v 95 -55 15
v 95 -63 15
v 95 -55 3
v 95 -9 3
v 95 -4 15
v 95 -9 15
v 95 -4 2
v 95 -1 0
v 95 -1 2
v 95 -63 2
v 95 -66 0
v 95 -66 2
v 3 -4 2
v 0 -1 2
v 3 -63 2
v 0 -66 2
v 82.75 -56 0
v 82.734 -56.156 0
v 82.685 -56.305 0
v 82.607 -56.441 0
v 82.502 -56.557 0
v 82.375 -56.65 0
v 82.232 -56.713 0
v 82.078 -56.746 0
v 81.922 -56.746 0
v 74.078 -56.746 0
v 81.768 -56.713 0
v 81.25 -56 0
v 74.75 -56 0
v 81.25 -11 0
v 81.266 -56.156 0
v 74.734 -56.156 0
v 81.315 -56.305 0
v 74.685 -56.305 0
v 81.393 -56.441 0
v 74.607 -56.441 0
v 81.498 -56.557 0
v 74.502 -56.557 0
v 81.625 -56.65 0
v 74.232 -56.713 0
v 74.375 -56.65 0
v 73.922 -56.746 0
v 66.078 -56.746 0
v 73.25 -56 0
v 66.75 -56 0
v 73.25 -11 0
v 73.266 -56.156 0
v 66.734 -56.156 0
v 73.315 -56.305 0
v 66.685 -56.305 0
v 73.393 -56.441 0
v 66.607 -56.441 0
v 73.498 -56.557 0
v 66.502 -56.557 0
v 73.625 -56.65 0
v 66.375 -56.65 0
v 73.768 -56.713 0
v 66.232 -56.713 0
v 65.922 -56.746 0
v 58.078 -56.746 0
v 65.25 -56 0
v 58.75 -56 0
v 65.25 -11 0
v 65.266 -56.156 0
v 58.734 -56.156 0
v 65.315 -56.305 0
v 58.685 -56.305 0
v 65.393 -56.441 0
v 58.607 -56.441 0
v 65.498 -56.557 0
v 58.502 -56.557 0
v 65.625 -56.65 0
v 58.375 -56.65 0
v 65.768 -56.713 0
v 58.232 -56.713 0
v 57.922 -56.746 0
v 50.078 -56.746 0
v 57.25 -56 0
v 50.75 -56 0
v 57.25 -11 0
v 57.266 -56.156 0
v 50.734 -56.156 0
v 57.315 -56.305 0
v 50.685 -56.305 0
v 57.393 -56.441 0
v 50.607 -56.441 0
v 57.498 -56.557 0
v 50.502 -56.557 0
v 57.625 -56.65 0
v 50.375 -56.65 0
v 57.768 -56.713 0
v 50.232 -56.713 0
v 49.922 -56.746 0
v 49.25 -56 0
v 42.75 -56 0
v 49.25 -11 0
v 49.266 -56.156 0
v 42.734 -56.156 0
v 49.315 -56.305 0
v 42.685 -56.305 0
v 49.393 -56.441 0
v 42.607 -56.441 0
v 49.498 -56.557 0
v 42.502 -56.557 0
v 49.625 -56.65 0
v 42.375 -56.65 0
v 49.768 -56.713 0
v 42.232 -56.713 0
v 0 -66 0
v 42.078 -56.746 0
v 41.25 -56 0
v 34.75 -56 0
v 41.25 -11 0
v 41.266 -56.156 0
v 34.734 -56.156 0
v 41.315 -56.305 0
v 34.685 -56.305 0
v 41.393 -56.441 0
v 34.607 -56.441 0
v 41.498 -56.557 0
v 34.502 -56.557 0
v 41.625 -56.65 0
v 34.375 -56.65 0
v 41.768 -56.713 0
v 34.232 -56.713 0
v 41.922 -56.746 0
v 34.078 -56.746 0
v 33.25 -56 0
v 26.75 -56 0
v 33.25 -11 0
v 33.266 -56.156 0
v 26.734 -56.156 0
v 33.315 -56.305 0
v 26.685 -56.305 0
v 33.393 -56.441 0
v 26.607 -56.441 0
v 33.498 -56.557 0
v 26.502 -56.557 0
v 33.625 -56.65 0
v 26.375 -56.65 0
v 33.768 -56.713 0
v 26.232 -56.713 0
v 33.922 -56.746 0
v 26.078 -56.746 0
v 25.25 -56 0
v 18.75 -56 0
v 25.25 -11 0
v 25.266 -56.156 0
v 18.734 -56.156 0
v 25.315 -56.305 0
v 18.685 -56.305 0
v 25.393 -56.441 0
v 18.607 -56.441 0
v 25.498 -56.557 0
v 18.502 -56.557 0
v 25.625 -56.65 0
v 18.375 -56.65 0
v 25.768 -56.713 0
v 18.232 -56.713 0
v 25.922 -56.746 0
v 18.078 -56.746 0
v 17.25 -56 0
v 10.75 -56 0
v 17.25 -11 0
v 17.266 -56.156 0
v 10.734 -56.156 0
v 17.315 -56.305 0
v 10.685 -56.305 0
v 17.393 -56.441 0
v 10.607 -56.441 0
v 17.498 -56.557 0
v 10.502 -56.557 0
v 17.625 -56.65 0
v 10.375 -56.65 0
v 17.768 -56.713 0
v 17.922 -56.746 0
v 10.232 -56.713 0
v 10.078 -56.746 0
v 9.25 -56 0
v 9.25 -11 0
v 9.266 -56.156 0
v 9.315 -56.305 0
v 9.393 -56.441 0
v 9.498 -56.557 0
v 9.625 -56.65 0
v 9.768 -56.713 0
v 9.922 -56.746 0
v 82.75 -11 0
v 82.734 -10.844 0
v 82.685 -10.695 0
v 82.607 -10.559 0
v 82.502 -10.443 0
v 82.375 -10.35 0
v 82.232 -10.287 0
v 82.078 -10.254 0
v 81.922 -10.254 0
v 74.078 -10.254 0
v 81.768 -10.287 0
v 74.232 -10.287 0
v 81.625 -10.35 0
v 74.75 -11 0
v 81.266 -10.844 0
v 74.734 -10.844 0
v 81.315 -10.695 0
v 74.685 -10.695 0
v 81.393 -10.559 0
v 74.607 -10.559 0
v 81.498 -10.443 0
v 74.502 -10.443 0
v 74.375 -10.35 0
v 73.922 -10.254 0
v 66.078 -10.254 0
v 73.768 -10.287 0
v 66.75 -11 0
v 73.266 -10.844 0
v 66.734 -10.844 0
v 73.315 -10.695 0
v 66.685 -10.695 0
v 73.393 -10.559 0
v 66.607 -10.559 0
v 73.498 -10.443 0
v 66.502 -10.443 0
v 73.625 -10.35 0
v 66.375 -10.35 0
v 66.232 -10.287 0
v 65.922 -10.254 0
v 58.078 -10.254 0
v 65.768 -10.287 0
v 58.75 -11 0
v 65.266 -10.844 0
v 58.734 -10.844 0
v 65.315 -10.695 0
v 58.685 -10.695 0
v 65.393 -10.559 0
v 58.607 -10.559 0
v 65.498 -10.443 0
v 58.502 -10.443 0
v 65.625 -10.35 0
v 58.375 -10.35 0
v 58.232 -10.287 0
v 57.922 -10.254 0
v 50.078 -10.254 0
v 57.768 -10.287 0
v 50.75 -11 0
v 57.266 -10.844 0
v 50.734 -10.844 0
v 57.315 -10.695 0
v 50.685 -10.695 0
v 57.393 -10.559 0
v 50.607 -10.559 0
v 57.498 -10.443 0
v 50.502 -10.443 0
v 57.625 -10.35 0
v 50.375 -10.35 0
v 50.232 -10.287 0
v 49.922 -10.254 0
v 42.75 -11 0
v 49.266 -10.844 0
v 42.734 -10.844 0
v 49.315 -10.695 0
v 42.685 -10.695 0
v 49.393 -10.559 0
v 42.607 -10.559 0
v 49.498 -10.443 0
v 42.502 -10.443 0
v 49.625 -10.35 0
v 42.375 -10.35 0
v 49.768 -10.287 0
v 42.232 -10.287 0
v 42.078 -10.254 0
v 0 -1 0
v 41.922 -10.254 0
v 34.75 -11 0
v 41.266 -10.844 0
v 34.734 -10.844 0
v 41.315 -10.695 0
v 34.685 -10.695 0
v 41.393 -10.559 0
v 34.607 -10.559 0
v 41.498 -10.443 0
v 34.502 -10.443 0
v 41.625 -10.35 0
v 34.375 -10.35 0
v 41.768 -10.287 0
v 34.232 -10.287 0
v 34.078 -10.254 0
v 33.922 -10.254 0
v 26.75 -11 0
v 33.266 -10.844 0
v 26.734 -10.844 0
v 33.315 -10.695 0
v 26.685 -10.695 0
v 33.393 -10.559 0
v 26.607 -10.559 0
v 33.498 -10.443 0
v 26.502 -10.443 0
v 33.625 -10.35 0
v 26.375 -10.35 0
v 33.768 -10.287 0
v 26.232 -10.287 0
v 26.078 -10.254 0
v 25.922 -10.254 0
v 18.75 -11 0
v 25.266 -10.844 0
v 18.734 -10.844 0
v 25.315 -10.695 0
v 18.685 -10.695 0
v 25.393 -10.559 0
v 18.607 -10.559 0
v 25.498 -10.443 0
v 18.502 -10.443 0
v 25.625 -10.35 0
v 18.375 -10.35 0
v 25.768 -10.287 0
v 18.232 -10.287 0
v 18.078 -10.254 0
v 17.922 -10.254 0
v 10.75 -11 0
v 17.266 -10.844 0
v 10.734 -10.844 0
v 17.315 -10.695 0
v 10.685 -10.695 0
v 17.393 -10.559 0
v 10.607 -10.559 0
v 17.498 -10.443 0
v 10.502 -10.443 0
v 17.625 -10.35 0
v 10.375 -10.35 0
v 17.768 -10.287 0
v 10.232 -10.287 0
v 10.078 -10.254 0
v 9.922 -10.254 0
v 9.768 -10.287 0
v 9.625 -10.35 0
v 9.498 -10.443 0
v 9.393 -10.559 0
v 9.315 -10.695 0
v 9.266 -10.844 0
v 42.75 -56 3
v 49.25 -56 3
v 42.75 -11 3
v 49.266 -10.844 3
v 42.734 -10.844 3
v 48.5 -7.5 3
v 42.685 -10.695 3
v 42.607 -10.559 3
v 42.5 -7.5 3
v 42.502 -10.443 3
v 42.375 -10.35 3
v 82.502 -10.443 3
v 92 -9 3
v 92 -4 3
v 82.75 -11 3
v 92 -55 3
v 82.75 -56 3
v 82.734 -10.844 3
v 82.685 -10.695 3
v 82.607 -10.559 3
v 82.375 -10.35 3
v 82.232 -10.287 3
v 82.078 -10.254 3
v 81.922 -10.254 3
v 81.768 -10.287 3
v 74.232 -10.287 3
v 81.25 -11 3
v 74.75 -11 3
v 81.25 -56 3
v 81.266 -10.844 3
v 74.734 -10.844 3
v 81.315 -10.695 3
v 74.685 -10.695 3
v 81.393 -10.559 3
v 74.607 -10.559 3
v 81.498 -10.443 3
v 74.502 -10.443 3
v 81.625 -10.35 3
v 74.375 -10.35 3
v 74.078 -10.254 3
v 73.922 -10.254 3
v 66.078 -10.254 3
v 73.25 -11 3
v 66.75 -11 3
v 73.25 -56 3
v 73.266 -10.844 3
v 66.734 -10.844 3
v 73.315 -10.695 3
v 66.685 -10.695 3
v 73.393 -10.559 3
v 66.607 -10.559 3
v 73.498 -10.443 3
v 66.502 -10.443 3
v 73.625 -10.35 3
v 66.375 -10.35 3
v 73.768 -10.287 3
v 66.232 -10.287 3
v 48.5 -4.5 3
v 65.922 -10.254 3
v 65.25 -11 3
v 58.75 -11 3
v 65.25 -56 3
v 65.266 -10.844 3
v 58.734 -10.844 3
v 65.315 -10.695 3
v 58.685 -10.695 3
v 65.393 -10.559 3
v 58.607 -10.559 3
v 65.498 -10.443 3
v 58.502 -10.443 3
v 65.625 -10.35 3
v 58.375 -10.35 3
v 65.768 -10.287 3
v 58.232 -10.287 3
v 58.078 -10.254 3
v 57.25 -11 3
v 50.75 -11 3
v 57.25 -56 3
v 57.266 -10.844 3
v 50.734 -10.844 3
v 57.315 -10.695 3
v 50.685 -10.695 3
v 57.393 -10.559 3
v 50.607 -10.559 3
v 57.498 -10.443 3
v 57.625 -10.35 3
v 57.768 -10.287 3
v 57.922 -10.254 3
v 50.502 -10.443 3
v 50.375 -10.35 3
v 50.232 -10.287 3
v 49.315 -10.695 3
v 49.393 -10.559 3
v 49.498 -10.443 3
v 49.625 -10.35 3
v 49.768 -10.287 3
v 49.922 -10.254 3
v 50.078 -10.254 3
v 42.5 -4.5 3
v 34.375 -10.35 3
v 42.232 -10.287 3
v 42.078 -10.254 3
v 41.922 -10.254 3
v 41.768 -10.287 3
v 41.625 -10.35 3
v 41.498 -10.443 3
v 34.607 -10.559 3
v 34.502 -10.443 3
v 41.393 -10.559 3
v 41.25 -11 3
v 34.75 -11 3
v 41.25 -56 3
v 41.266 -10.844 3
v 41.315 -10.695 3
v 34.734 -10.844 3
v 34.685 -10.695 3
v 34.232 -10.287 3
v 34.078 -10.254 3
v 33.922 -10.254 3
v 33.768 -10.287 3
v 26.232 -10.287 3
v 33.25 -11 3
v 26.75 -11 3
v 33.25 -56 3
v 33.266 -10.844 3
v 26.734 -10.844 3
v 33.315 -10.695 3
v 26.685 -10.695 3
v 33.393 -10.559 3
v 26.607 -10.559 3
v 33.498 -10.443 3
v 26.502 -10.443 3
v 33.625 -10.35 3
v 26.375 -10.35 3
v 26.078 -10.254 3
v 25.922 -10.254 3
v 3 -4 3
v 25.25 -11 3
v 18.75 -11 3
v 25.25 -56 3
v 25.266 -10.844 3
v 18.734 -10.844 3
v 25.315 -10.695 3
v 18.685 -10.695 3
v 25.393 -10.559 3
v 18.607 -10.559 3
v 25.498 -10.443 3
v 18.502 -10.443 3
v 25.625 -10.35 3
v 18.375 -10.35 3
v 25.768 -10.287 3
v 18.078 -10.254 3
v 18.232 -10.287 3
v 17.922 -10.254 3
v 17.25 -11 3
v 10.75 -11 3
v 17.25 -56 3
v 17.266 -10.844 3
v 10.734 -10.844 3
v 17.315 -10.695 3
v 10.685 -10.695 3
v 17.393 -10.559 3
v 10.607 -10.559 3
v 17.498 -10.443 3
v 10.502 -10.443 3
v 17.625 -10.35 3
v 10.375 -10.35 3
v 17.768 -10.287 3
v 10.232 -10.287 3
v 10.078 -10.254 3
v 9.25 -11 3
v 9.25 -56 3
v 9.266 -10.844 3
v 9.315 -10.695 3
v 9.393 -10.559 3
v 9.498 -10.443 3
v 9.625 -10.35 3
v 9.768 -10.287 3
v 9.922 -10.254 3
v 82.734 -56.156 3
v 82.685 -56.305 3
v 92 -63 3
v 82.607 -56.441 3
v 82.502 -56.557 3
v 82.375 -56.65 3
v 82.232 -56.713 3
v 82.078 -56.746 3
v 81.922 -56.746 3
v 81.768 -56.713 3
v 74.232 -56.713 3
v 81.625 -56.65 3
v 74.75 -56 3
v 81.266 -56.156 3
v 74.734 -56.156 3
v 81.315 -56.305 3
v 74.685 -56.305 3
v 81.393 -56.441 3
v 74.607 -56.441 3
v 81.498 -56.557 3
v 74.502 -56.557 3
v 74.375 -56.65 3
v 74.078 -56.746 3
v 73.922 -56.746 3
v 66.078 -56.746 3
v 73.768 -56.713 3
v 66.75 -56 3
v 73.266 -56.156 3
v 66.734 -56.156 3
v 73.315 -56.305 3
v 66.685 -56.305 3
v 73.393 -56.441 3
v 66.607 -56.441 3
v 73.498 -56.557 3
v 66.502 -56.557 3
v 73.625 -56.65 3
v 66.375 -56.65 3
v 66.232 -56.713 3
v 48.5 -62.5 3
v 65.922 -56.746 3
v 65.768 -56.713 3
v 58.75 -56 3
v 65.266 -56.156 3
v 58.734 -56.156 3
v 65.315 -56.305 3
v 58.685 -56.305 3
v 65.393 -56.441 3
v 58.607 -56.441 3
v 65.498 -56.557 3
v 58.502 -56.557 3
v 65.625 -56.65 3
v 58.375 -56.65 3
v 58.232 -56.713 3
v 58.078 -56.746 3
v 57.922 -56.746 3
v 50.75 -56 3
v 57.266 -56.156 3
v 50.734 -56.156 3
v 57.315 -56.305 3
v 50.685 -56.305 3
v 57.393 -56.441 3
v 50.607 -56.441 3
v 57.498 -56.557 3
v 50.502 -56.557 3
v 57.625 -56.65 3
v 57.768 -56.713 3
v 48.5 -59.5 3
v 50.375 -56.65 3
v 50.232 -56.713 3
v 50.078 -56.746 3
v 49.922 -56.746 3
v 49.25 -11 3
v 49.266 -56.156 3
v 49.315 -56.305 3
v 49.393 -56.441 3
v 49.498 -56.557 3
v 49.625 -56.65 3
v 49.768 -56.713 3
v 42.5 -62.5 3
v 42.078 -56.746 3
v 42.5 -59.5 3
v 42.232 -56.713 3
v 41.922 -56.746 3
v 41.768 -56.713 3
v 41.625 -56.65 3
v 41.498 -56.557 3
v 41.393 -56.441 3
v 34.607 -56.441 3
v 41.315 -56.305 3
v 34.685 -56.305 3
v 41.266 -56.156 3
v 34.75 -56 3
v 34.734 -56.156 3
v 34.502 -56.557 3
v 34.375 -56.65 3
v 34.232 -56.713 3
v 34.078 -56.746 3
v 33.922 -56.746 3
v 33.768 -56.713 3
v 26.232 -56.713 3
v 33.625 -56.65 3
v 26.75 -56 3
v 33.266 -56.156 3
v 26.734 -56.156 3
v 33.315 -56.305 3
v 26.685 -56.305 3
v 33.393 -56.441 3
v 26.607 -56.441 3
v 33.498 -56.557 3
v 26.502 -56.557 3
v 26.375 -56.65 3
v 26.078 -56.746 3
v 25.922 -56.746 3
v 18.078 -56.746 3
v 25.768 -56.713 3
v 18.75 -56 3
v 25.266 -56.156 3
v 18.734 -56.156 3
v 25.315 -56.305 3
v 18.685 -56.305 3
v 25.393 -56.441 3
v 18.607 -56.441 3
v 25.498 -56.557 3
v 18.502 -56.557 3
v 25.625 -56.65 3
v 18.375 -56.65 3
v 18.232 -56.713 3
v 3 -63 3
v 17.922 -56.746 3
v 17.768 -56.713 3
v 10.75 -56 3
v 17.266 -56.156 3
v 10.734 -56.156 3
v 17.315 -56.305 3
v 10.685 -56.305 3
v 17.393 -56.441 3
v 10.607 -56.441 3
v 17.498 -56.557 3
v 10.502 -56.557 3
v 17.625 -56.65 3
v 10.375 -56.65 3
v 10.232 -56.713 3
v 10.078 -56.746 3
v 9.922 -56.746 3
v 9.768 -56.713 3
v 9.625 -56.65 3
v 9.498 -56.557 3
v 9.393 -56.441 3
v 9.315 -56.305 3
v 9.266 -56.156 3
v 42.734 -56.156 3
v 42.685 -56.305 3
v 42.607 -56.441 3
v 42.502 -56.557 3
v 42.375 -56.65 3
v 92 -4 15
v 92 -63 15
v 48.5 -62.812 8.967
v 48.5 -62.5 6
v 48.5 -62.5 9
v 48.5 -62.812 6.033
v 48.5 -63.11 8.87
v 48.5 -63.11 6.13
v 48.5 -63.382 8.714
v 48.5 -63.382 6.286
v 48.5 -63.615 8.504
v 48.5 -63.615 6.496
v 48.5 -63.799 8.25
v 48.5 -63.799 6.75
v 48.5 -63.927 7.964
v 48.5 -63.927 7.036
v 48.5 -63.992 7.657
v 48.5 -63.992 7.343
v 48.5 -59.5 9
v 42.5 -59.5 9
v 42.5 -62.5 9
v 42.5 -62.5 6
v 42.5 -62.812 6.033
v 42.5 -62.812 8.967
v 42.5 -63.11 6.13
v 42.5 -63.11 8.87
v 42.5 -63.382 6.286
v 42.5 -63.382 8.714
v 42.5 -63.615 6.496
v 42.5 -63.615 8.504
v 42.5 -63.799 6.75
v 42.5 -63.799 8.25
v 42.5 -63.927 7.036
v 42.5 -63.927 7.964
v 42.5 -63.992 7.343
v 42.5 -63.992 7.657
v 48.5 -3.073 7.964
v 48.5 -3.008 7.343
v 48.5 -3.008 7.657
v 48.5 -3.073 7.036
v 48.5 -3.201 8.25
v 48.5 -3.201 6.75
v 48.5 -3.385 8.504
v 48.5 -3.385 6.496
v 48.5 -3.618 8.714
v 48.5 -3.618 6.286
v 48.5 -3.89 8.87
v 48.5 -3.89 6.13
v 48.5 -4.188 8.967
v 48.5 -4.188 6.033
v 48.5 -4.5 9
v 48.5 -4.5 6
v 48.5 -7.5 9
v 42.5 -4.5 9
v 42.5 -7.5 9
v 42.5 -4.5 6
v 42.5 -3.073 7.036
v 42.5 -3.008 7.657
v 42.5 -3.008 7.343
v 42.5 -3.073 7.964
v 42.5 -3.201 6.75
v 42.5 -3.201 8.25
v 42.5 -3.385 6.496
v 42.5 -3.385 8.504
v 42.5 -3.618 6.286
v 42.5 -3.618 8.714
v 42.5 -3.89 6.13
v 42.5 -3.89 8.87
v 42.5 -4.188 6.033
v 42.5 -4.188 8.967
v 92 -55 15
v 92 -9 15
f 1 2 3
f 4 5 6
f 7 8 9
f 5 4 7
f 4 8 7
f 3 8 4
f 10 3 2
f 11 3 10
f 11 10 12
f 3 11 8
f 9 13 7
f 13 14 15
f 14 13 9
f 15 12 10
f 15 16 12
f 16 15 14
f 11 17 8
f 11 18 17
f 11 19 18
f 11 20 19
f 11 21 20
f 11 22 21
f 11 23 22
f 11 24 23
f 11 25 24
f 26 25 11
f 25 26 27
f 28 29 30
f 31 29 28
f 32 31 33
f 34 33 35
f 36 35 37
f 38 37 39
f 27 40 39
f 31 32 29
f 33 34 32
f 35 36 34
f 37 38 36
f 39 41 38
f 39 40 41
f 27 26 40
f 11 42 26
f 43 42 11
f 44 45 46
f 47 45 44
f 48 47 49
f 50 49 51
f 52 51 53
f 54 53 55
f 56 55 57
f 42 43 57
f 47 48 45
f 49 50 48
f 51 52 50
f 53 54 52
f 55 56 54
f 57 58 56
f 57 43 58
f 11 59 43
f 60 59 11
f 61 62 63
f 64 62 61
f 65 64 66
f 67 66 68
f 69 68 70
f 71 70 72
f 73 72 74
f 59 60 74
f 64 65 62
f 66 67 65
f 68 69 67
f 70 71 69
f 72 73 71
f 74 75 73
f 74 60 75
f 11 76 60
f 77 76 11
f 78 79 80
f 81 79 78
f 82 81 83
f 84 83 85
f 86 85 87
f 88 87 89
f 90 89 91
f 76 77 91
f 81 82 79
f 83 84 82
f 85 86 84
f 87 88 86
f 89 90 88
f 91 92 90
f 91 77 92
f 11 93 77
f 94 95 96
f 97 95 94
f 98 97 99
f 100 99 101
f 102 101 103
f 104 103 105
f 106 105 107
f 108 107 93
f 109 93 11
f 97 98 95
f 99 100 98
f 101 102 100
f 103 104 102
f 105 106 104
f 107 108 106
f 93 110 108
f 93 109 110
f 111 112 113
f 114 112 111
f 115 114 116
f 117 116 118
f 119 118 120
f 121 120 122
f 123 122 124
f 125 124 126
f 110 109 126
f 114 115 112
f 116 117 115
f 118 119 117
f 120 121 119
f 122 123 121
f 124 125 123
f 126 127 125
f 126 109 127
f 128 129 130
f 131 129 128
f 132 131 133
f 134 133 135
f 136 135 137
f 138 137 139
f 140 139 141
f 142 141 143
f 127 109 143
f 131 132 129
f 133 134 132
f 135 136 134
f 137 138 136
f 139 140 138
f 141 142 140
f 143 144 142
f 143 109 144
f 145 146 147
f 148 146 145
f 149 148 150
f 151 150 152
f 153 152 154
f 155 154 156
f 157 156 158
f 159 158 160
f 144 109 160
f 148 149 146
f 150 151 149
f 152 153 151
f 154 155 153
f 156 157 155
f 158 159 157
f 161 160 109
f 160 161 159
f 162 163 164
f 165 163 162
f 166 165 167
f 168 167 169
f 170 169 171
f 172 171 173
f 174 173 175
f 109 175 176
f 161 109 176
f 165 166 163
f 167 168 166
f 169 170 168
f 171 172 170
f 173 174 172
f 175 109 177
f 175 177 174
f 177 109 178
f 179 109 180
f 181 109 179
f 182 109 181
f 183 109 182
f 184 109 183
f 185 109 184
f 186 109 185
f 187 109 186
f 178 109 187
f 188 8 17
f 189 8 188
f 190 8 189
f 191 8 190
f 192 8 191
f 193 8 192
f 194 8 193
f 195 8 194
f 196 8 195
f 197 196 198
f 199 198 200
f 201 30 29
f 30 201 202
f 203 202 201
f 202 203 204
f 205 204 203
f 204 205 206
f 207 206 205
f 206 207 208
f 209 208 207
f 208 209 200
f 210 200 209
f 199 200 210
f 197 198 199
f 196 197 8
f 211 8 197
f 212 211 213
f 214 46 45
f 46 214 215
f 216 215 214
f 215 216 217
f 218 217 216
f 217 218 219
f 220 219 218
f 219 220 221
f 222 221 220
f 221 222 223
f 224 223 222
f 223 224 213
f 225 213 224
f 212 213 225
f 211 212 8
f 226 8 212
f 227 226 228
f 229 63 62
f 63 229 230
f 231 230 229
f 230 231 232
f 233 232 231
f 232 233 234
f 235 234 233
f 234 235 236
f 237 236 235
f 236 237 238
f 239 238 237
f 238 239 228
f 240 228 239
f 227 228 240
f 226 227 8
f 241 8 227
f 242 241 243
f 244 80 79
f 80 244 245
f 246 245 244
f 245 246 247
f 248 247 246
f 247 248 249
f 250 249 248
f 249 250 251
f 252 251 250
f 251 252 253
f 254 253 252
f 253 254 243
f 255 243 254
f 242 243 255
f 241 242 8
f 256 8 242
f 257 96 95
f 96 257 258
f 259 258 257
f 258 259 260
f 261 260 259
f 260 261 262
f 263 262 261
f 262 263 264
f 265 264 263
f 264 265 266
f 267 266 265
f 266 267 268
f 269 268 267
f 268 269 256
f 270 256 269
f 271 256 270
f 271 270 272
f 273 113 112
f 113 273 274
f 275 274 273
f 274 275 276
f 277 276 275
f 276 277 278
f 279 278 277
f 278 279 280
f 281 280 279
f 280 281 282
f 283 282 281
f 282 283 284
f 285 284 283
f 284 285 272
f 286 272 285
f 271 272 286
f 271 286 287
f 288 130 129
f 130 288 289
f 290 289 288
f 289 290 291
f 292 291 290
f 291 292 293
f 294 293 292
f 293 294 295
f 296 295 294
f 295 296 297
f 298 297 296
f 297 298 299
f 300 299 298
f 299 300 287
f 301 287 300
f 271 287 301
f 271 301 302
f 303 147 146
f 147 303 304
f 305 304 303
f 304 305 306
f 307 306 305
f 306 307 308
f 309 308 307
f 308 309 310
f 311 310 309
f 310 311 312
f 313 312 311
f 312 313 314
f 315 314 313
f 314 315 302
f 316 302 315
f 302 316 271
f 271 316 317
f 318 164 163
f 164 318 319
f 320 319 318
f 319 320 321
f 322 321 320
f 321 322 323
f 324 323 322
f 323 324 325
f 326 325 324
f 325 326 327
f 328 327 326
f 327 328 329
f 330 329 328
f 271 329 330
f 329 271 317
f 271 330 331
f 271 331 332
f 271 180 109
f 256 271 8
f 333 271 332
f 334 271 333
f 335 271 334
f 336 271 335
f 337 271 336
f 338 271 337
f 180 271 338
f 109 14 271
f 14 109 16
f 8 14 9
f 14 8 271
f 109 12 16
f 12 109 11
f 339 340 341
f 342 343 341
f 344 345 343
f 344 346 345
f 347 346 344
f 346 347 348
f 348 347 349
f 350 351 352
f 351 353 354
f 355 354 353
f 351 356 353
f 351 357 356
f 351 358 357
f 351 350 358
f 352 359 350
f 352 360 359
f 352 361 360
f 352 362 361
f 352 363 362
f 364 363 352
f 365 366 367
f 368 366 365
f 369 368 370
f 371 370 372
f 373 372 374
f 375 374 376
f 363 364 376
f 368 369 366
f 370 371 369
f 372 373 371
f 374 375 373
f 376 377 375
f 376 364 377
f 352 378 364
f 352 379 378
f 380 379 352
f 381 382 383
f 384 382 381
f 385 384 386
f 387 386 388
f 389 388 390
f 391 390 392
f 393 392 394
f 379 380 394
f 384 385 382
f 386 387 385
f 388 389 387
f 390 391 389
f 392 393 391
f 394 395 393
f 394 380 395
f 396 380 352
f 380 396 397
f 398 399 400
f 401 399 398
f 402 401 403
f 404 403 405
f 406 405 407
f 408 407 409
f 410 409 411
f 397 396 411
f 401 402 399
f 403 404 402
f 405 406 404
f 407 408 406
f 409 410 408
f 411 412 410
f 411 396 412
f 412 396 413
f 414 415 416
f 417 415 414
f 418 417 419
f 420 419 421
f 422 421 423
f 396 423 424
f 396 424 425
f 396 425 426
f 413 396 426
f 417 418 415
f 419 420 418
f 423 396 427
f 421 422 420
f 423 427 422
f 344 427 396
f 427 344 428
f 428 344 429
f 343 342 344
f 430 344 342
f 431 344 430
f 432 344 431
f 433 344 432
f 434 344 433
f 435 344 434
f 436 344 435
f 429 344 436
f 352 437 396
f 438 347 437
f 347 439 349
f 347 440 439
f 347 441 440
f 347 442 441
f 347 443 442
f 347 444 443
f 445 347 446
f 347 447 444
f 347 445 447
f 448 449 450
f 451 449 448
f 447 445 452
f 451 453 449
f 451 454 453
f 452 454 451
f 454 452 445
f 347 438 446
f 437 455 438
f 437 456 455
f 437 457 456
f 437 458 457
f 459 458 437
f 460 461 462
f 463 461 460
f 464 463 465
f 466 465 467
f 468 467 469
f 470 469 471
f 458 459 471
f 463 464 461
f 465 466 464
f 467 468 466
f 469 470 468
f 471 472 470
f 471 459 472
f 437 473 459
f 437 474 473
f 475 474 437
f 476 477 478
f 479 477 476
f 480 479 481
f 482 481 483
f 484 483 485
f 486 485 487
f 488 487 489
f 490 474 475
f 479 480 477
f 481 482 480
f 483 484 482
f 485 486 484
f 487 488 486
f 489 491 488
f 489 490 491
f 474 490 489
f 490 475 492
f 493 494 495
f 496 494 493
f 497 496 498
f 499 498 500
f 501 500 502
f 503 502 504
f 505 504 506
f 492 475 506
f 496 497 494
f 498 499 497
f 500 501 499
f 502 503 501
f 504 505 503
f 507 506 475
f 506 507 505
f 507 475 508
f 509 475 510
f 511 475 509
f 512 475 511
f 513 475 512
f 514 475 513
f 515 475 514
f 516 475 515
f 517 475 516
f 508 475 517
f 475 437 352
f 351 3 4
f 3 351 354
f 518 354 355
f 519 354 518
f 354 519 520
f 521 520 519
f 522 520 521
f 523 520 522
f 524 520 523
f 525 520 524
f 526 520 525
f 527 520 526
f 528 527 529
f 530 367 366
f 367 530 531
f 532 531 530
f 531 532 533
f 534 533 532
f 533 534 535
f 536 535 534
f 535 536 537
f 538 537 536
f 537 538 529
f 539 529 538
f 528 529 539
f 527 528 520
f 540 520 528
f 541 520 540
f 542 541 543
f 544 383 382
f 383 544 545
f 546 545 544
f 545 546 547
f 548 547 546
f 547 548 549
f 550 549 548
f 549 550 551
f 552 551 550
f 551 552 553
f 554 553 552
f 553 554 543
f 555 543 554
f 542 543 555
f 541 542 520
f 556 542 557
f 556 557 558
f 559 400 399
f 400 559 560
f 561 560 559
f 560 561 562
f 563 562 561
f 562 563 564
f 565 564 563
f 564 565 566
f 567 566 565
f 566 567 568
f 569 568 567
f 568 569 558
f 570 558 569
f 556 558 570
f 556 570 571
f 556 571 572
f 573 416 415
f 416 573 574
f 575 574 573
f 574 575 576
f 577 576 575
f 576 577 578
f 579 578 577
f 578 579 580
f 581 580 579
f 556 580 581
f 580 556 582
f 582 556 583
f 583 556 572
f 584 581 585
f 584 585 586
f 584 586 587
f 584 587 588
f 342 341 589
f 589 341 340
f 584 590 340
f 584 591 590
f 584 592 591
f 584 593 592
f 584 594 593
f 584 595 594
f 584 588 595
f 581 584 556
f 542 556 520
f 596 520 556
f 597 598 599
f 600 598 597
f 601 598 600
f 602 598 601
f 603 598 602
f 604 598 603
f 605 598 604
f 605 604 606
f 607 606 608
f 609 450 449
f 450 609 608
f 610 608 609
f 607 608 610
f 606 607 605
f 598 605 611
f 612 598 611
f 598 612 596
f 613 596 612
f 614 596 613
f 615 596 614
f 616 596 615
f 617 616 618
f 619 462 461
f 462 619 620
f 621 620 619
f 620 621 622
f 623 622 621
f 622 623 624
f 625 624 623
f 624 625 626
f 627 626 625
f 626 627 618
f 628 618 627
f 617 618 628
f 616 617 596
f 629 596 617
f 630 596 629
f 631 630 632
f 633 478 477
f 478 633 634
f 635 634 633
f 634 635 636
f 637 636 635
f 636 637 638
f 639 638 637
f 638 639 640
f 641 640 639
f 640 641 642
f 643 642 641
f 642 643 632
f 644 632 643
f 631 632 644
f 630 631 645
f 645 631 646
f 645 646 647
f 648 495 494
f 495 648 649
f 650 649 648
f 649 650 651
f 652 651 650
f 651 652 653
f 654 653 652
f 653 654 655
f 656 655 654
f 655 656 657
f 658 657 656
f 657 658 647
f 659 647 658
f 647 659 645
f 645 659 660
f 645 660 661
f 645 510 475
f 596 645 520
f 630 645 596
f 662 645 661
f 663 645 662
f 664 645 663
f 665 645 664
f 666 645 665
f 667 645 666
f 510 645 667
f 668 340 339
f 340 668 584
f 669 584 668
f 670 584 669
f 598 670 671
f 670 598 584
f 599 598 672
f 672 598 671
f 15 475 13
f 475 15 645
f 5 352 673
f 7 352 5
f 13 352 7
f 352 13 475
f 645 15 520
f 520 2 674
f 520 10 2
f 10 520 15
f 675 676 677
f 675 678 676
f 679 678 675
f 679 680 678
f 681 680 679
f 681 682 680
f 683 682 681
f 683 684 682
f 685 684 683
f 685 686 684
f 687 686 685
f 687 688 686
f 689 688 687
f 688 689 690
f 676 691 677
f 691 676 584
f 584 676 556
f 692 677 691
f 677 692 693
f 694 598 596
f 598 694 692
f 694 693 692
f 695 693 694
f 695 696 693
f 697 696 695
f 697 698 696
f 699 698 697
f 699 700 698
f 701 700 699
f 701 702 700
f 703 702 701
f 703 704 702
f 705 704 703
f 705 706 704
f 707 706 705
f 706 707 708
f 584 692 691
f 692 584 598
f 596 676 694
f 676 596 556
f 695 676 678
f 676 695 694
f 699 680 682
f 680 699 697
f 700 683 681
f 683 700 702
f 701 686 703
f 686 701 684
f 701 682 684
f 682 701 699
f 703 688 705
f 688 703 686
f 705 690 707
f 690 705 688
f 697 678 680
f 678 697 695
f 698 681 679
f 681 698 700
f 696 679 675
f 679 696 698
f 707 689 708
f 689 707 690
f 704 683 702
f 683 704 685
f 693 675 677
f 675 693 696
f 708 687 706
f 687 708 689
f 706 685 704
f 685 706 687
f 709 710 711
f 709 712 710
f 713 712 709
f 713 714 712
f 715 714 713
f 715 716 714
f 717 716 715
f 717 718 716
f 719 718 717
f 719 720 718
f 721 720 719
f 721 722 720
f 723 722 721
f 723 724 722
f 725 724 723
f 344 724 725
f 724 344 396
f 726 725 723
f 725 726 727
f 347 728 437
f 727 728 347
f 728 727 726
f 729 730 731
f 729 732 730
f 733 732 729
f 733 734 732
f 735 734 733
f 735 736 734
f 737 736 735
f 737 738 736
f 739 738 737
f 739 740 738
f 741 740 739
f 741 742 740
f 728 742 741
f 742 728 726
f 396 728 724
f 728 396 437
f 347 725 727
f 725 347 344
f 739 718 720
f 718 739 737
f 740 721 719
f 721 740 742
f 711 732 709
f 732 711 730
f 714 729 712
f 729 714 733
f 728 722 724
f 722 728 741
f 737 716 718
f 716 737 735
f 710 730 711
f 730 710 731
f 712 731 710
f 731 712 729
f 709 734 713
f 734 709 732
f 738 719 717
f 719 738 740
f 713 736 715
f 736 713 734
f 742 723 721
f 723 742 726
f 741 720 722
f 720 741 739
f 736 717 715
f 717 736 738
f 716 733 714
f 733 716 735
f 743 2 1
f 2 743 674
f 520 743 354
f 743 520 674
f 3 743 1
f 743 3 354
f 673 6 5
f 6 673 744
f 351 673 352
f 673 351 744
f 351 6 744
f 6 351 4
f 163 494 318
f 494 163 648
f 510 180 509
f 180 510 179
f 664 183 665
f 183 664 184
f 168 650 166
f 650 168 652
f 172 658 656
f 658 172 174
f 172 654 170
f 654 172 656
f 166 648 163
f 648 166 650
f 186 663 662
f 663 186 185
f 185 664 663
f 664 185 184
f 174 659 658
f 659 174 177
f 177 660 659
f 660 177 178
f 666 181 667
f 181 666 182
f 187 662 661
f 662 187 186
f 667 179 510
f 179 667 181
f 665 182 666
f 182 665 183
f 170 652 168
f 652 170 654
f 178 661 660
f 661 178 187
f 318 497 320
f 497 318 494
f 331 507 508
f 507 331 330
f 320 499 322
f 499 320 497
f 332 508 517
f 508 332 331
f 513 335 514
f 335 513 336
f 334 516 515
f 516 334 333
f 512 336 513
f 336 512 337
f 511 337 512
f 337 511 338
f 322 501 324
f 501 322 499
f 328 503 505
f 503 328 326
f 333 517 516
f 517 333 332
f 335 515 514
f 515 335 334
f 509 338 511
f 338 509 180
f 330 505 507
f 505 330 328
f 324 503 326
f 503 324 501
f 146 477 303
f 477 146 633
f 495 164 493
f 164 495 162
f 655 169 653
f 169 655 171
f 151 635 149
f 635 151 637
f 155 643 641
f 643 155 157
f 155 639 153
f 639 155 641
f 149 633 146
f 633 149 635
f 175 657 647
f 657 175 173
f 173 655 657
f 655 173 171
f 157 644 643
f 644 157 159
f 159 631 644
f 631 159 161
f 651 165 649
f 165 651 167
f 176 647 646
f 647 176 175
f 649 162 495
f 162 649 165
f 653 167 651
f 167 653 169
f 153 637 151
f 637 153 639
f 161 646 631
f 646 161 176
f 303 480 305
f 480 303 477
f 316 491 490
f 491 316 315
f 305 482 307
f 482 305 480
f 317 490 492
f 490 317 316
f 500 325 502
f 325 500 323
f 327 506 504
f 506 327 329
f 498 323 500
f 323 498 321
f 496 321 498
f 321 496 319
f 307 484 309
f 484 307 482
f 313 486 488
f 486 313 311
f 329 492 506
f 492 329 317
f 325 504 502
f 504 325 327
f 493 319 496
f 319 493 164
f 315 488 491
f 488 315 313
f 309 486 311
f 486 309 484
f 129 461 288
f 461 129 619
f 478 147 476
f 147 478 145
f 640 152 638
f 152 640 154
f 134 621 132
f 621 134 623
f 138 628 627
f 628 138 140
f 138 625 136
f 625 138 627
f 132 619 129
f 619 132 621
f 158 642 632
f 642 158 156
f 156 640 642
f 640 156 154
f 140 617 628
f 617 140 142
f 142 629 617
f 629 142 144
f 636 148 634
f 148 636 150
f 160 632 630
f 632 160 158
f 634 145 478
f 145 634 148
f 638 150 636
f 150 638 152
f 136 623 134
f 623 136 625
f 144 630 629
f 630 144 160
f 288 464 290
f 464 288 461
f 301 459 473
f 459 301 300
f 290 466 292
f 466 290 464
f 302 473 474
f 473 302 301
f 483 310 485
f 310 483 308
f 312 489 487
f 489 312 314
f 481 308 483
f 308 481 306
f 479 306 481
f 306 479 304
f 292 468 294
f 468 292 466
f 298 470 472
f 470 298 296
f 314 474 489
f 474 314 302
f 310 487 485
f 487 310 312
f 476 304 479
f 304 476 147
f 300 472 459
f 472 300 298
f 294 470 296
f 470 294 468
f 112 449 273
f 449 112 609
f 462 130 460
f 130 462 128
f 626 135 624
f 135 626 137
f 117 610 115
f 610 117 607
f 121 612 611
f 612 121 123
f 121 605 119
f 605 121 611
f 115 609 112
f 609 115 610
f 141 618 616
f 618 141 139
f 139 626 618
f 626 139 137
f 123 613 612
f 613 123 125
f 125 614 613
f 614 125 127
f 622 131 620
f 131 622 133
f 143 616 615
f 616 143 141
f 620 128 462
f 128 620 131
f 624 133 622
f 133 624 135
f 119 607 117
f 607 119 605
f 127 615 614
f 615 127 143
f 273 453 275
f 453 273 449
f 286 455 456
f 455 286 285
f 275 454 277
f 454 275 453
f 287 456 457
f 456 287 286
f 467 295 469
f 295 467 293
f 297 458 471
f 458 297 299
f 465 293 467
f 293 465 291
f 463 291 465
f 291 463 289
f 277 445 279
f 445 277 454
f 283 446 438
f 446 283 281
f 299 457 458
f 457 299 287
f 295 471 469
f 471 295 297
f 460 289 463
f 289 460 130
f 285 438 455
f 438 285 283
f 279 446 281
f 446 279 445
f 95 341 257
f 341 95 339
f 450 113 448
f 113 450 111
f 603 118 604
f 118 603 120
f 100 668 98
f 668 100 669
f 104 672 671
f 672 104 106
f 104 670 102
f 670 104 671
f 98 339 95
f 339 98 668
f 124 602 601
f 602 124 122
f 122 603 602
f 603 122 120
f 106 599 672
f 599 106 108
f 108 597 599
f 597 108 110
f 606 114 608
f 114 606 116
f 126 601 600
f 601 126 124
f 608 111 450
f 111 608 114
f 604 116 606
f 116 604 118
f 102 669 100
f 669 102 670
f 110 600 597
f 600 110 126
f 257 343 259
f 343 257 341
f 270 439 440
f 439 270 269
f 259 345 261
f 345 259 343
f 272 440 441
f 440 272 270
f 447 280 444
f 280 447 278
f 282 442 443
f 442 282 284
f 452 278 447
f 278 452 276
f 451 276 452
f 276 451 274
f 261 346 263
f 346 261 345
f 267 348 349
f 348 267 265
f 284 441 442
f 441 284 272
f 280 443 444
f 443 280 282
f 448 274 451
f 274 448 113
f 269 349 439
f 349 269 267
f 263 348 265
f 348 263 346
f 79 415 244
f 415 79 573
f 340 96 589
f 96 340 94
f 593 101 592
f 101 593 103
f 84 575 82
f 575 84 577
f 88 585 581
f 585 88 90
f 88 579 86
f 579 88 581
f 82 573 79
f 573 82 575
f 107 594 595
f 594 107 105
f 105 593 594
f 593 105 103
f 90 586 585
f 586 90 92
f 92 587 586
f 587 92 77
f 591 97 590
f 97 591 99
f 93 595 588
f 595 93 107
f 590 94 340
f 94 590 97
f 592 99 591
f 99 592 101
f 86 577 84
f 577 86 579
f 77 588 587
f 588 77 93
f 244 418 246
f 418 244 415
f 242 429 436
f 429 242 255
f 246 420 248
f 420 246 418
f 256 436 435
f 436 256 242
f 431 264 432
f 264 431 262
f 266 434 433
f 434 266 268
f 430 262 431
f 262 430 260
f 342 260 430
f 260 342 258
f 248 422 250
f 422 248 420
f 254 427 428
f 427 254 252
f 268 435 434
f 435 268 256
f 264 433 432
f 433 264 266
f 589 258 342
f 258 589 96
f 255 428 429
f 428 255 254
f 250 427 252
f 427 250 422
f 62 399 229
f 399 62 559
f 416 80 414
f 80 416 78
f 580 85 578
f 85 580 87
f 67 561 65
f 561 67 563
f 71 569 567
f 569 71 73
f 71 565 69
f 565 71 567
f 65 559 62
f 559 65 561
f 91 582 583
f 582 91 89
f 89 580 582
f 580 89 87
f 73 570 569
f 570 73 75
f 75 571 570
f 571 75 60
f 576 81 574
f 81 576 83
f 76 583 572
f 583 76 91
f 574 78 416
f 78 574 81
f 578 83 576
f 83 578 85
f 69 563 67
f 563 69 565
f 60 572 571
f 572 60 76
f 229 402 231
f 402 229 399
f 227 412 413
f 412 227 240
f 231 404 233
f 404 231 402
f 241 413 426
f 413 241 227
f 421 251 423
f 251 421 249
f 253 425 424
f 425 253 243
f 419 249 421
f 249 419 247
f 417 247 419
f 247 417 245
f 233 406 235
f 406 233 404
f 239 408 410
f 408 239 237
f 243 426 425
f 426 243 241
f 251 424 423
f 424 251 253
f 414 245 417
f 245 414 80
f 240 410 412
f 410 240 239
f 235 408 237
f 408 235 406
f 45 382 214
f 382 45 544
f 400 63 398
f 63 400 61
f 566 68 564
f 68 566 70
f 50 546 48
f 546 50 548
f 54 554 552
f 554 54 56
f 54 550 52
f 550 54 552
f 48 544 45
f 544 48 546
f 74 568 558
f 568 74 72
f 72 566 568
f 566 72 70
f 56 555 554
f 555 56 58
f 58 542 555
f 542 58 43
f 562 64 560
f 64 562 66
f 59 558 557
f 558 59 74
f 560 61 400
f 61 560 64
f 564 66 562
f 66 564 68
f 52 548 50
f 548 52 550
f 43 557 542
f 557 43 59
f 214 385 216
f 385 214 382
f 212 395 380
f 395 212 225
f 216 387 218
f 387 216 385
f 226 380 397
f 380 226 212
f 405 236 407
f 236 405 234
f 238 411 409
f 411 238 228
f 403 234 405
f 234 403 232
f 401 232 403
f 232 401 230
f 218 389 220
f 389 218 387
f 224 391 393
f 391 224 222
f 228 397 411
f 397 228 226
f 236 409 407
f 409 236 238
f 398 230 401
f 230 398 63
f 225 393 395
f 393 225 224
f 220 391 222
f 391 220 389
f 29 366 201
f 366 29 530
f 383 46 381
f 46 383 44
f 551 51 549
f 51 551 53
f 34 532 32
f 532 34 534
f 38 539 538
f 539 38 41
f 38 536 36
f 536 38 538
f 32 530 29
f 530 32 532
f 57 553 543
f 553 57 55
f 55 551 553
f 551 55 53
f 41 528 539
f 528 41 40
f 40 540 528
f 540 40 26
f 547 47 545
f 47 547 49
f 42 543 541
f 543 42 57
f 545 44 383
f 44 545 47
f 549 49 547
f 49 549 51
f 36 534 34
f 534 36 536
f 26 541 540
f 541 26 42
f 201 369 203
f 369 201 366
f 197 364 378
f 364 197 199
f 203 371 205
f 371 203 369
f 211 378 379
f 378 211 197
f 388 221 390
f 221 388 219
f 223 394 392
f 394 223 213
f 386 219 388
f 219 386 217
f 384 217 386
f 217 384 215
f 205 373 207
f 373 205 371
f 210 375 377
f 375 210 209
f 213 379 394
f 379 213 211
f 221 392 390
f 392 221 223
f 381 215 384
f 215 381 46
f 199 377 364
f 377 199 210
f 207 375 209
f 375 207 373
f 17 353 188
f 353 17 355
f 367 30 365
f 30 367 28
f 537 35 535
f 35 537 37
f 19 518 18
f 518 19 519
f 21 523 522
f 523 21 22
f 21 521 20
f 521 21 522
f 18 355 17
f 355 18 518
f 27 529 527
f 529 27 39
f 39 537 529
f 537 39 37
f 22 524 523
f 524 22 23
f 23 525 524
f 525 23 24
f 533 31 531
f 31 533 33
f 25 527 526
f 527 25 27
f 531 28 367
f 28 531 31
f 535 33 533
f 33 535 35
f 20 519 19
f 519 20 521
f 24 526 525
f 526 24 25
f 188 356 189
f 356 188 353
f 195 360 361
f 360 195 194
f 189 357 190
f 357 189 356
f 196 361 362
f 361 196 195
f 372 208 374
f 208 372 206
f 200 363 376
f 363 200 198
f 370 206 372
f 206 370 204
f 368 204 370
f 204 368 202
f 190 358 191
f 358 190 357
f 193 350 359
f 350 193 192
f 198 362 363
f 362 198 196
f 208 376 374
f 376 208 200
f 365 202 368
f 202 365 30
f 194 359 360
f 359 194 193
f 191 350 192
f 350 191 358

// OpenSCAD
// Pi TNC project case

$fs = 0.01;

module standoffs(height=10)
{
	difference()
	{
		cylinder(h=height, r=3.5);
		cylinder(h=height, r=1.3);
	}
}

module pi_standoffs()
{
	translate([ 3.5, 3.5,  0]) standoffs();
	translate([61.5, 3.5,  0]) standoffs();
	translate([ 3.5,52.5,  0]) standoffs();
	translate([61.5,52.5,  0]) standoffs();
}

module lid_vent(len=35)
{
	translate([-0.75,  0,-2]) cube([1.5,len,10]);
	translate([    0,  0, 0]) cylinder(r=0.75, h=10);
	translate([    0,len, 0]) cylinder(r=0.75, h=10);
}

module box()
{
	difference()
	{
		union()
		{
			cube([95,65,2]); // Bottom plate
			translate([0,0,2]) cube([3,65,44]);
			translate([0,62,2]) cube([95,3,44]);
			translate([0,0,2]) cube([95,3,44]);
			translate([92,0,2]) cube([3,65,11]);
		}
		translate([7+4.6,-1,11]) cube([12,5,8]);
		translate([7+23,-1,12]) cube([18,5,10]);
		translate([7+53.5-5,-1,12]) cube([10,5,10]);
		translate([-1,3.5+19,8]) cube([5,16,6]);
		translate([42.5,-1,39])
			cube([6,70,3]);
		translate([70,32.5,-1])
			cylinder(h=5, r=2);
		translate([70-(26.4*2),32.5,-1])
			cylinder(h=5, r=2);
	}
	translate([7,3.5,2]) pi_standoffs();
}

module lid()
{
	difference()
	{
		union()
		{
			cube([95,65,2]);
			translate([3,3,2])
				cube([92,59,1]);
			translate([42.5,3.5,3])
				cube([6,3,6]);
			translate([42.5,3.5,7.5])
				rotate(a=[0,90,0])
					cylinder(h=6,r=1.5);
			translate([42.5,65-6.5,3])
				cube([6,3,6]);
			translate([42.5,65-3.5,7.5])
				rotate(a=[0,90,0])
					cylinder(h=6,r=1.5);
			translate([92,3,3])
				cube([3,8,12]);
			translate([92,57,3])
				cube([3,5,12]);
		}
		for ( i = [0 : 9] )
		{
			translate([10+(8*i),10,-1]) lid_vent(len=45);
		}
	}
}

//box();
translate([0,-66,0])
	lid();
